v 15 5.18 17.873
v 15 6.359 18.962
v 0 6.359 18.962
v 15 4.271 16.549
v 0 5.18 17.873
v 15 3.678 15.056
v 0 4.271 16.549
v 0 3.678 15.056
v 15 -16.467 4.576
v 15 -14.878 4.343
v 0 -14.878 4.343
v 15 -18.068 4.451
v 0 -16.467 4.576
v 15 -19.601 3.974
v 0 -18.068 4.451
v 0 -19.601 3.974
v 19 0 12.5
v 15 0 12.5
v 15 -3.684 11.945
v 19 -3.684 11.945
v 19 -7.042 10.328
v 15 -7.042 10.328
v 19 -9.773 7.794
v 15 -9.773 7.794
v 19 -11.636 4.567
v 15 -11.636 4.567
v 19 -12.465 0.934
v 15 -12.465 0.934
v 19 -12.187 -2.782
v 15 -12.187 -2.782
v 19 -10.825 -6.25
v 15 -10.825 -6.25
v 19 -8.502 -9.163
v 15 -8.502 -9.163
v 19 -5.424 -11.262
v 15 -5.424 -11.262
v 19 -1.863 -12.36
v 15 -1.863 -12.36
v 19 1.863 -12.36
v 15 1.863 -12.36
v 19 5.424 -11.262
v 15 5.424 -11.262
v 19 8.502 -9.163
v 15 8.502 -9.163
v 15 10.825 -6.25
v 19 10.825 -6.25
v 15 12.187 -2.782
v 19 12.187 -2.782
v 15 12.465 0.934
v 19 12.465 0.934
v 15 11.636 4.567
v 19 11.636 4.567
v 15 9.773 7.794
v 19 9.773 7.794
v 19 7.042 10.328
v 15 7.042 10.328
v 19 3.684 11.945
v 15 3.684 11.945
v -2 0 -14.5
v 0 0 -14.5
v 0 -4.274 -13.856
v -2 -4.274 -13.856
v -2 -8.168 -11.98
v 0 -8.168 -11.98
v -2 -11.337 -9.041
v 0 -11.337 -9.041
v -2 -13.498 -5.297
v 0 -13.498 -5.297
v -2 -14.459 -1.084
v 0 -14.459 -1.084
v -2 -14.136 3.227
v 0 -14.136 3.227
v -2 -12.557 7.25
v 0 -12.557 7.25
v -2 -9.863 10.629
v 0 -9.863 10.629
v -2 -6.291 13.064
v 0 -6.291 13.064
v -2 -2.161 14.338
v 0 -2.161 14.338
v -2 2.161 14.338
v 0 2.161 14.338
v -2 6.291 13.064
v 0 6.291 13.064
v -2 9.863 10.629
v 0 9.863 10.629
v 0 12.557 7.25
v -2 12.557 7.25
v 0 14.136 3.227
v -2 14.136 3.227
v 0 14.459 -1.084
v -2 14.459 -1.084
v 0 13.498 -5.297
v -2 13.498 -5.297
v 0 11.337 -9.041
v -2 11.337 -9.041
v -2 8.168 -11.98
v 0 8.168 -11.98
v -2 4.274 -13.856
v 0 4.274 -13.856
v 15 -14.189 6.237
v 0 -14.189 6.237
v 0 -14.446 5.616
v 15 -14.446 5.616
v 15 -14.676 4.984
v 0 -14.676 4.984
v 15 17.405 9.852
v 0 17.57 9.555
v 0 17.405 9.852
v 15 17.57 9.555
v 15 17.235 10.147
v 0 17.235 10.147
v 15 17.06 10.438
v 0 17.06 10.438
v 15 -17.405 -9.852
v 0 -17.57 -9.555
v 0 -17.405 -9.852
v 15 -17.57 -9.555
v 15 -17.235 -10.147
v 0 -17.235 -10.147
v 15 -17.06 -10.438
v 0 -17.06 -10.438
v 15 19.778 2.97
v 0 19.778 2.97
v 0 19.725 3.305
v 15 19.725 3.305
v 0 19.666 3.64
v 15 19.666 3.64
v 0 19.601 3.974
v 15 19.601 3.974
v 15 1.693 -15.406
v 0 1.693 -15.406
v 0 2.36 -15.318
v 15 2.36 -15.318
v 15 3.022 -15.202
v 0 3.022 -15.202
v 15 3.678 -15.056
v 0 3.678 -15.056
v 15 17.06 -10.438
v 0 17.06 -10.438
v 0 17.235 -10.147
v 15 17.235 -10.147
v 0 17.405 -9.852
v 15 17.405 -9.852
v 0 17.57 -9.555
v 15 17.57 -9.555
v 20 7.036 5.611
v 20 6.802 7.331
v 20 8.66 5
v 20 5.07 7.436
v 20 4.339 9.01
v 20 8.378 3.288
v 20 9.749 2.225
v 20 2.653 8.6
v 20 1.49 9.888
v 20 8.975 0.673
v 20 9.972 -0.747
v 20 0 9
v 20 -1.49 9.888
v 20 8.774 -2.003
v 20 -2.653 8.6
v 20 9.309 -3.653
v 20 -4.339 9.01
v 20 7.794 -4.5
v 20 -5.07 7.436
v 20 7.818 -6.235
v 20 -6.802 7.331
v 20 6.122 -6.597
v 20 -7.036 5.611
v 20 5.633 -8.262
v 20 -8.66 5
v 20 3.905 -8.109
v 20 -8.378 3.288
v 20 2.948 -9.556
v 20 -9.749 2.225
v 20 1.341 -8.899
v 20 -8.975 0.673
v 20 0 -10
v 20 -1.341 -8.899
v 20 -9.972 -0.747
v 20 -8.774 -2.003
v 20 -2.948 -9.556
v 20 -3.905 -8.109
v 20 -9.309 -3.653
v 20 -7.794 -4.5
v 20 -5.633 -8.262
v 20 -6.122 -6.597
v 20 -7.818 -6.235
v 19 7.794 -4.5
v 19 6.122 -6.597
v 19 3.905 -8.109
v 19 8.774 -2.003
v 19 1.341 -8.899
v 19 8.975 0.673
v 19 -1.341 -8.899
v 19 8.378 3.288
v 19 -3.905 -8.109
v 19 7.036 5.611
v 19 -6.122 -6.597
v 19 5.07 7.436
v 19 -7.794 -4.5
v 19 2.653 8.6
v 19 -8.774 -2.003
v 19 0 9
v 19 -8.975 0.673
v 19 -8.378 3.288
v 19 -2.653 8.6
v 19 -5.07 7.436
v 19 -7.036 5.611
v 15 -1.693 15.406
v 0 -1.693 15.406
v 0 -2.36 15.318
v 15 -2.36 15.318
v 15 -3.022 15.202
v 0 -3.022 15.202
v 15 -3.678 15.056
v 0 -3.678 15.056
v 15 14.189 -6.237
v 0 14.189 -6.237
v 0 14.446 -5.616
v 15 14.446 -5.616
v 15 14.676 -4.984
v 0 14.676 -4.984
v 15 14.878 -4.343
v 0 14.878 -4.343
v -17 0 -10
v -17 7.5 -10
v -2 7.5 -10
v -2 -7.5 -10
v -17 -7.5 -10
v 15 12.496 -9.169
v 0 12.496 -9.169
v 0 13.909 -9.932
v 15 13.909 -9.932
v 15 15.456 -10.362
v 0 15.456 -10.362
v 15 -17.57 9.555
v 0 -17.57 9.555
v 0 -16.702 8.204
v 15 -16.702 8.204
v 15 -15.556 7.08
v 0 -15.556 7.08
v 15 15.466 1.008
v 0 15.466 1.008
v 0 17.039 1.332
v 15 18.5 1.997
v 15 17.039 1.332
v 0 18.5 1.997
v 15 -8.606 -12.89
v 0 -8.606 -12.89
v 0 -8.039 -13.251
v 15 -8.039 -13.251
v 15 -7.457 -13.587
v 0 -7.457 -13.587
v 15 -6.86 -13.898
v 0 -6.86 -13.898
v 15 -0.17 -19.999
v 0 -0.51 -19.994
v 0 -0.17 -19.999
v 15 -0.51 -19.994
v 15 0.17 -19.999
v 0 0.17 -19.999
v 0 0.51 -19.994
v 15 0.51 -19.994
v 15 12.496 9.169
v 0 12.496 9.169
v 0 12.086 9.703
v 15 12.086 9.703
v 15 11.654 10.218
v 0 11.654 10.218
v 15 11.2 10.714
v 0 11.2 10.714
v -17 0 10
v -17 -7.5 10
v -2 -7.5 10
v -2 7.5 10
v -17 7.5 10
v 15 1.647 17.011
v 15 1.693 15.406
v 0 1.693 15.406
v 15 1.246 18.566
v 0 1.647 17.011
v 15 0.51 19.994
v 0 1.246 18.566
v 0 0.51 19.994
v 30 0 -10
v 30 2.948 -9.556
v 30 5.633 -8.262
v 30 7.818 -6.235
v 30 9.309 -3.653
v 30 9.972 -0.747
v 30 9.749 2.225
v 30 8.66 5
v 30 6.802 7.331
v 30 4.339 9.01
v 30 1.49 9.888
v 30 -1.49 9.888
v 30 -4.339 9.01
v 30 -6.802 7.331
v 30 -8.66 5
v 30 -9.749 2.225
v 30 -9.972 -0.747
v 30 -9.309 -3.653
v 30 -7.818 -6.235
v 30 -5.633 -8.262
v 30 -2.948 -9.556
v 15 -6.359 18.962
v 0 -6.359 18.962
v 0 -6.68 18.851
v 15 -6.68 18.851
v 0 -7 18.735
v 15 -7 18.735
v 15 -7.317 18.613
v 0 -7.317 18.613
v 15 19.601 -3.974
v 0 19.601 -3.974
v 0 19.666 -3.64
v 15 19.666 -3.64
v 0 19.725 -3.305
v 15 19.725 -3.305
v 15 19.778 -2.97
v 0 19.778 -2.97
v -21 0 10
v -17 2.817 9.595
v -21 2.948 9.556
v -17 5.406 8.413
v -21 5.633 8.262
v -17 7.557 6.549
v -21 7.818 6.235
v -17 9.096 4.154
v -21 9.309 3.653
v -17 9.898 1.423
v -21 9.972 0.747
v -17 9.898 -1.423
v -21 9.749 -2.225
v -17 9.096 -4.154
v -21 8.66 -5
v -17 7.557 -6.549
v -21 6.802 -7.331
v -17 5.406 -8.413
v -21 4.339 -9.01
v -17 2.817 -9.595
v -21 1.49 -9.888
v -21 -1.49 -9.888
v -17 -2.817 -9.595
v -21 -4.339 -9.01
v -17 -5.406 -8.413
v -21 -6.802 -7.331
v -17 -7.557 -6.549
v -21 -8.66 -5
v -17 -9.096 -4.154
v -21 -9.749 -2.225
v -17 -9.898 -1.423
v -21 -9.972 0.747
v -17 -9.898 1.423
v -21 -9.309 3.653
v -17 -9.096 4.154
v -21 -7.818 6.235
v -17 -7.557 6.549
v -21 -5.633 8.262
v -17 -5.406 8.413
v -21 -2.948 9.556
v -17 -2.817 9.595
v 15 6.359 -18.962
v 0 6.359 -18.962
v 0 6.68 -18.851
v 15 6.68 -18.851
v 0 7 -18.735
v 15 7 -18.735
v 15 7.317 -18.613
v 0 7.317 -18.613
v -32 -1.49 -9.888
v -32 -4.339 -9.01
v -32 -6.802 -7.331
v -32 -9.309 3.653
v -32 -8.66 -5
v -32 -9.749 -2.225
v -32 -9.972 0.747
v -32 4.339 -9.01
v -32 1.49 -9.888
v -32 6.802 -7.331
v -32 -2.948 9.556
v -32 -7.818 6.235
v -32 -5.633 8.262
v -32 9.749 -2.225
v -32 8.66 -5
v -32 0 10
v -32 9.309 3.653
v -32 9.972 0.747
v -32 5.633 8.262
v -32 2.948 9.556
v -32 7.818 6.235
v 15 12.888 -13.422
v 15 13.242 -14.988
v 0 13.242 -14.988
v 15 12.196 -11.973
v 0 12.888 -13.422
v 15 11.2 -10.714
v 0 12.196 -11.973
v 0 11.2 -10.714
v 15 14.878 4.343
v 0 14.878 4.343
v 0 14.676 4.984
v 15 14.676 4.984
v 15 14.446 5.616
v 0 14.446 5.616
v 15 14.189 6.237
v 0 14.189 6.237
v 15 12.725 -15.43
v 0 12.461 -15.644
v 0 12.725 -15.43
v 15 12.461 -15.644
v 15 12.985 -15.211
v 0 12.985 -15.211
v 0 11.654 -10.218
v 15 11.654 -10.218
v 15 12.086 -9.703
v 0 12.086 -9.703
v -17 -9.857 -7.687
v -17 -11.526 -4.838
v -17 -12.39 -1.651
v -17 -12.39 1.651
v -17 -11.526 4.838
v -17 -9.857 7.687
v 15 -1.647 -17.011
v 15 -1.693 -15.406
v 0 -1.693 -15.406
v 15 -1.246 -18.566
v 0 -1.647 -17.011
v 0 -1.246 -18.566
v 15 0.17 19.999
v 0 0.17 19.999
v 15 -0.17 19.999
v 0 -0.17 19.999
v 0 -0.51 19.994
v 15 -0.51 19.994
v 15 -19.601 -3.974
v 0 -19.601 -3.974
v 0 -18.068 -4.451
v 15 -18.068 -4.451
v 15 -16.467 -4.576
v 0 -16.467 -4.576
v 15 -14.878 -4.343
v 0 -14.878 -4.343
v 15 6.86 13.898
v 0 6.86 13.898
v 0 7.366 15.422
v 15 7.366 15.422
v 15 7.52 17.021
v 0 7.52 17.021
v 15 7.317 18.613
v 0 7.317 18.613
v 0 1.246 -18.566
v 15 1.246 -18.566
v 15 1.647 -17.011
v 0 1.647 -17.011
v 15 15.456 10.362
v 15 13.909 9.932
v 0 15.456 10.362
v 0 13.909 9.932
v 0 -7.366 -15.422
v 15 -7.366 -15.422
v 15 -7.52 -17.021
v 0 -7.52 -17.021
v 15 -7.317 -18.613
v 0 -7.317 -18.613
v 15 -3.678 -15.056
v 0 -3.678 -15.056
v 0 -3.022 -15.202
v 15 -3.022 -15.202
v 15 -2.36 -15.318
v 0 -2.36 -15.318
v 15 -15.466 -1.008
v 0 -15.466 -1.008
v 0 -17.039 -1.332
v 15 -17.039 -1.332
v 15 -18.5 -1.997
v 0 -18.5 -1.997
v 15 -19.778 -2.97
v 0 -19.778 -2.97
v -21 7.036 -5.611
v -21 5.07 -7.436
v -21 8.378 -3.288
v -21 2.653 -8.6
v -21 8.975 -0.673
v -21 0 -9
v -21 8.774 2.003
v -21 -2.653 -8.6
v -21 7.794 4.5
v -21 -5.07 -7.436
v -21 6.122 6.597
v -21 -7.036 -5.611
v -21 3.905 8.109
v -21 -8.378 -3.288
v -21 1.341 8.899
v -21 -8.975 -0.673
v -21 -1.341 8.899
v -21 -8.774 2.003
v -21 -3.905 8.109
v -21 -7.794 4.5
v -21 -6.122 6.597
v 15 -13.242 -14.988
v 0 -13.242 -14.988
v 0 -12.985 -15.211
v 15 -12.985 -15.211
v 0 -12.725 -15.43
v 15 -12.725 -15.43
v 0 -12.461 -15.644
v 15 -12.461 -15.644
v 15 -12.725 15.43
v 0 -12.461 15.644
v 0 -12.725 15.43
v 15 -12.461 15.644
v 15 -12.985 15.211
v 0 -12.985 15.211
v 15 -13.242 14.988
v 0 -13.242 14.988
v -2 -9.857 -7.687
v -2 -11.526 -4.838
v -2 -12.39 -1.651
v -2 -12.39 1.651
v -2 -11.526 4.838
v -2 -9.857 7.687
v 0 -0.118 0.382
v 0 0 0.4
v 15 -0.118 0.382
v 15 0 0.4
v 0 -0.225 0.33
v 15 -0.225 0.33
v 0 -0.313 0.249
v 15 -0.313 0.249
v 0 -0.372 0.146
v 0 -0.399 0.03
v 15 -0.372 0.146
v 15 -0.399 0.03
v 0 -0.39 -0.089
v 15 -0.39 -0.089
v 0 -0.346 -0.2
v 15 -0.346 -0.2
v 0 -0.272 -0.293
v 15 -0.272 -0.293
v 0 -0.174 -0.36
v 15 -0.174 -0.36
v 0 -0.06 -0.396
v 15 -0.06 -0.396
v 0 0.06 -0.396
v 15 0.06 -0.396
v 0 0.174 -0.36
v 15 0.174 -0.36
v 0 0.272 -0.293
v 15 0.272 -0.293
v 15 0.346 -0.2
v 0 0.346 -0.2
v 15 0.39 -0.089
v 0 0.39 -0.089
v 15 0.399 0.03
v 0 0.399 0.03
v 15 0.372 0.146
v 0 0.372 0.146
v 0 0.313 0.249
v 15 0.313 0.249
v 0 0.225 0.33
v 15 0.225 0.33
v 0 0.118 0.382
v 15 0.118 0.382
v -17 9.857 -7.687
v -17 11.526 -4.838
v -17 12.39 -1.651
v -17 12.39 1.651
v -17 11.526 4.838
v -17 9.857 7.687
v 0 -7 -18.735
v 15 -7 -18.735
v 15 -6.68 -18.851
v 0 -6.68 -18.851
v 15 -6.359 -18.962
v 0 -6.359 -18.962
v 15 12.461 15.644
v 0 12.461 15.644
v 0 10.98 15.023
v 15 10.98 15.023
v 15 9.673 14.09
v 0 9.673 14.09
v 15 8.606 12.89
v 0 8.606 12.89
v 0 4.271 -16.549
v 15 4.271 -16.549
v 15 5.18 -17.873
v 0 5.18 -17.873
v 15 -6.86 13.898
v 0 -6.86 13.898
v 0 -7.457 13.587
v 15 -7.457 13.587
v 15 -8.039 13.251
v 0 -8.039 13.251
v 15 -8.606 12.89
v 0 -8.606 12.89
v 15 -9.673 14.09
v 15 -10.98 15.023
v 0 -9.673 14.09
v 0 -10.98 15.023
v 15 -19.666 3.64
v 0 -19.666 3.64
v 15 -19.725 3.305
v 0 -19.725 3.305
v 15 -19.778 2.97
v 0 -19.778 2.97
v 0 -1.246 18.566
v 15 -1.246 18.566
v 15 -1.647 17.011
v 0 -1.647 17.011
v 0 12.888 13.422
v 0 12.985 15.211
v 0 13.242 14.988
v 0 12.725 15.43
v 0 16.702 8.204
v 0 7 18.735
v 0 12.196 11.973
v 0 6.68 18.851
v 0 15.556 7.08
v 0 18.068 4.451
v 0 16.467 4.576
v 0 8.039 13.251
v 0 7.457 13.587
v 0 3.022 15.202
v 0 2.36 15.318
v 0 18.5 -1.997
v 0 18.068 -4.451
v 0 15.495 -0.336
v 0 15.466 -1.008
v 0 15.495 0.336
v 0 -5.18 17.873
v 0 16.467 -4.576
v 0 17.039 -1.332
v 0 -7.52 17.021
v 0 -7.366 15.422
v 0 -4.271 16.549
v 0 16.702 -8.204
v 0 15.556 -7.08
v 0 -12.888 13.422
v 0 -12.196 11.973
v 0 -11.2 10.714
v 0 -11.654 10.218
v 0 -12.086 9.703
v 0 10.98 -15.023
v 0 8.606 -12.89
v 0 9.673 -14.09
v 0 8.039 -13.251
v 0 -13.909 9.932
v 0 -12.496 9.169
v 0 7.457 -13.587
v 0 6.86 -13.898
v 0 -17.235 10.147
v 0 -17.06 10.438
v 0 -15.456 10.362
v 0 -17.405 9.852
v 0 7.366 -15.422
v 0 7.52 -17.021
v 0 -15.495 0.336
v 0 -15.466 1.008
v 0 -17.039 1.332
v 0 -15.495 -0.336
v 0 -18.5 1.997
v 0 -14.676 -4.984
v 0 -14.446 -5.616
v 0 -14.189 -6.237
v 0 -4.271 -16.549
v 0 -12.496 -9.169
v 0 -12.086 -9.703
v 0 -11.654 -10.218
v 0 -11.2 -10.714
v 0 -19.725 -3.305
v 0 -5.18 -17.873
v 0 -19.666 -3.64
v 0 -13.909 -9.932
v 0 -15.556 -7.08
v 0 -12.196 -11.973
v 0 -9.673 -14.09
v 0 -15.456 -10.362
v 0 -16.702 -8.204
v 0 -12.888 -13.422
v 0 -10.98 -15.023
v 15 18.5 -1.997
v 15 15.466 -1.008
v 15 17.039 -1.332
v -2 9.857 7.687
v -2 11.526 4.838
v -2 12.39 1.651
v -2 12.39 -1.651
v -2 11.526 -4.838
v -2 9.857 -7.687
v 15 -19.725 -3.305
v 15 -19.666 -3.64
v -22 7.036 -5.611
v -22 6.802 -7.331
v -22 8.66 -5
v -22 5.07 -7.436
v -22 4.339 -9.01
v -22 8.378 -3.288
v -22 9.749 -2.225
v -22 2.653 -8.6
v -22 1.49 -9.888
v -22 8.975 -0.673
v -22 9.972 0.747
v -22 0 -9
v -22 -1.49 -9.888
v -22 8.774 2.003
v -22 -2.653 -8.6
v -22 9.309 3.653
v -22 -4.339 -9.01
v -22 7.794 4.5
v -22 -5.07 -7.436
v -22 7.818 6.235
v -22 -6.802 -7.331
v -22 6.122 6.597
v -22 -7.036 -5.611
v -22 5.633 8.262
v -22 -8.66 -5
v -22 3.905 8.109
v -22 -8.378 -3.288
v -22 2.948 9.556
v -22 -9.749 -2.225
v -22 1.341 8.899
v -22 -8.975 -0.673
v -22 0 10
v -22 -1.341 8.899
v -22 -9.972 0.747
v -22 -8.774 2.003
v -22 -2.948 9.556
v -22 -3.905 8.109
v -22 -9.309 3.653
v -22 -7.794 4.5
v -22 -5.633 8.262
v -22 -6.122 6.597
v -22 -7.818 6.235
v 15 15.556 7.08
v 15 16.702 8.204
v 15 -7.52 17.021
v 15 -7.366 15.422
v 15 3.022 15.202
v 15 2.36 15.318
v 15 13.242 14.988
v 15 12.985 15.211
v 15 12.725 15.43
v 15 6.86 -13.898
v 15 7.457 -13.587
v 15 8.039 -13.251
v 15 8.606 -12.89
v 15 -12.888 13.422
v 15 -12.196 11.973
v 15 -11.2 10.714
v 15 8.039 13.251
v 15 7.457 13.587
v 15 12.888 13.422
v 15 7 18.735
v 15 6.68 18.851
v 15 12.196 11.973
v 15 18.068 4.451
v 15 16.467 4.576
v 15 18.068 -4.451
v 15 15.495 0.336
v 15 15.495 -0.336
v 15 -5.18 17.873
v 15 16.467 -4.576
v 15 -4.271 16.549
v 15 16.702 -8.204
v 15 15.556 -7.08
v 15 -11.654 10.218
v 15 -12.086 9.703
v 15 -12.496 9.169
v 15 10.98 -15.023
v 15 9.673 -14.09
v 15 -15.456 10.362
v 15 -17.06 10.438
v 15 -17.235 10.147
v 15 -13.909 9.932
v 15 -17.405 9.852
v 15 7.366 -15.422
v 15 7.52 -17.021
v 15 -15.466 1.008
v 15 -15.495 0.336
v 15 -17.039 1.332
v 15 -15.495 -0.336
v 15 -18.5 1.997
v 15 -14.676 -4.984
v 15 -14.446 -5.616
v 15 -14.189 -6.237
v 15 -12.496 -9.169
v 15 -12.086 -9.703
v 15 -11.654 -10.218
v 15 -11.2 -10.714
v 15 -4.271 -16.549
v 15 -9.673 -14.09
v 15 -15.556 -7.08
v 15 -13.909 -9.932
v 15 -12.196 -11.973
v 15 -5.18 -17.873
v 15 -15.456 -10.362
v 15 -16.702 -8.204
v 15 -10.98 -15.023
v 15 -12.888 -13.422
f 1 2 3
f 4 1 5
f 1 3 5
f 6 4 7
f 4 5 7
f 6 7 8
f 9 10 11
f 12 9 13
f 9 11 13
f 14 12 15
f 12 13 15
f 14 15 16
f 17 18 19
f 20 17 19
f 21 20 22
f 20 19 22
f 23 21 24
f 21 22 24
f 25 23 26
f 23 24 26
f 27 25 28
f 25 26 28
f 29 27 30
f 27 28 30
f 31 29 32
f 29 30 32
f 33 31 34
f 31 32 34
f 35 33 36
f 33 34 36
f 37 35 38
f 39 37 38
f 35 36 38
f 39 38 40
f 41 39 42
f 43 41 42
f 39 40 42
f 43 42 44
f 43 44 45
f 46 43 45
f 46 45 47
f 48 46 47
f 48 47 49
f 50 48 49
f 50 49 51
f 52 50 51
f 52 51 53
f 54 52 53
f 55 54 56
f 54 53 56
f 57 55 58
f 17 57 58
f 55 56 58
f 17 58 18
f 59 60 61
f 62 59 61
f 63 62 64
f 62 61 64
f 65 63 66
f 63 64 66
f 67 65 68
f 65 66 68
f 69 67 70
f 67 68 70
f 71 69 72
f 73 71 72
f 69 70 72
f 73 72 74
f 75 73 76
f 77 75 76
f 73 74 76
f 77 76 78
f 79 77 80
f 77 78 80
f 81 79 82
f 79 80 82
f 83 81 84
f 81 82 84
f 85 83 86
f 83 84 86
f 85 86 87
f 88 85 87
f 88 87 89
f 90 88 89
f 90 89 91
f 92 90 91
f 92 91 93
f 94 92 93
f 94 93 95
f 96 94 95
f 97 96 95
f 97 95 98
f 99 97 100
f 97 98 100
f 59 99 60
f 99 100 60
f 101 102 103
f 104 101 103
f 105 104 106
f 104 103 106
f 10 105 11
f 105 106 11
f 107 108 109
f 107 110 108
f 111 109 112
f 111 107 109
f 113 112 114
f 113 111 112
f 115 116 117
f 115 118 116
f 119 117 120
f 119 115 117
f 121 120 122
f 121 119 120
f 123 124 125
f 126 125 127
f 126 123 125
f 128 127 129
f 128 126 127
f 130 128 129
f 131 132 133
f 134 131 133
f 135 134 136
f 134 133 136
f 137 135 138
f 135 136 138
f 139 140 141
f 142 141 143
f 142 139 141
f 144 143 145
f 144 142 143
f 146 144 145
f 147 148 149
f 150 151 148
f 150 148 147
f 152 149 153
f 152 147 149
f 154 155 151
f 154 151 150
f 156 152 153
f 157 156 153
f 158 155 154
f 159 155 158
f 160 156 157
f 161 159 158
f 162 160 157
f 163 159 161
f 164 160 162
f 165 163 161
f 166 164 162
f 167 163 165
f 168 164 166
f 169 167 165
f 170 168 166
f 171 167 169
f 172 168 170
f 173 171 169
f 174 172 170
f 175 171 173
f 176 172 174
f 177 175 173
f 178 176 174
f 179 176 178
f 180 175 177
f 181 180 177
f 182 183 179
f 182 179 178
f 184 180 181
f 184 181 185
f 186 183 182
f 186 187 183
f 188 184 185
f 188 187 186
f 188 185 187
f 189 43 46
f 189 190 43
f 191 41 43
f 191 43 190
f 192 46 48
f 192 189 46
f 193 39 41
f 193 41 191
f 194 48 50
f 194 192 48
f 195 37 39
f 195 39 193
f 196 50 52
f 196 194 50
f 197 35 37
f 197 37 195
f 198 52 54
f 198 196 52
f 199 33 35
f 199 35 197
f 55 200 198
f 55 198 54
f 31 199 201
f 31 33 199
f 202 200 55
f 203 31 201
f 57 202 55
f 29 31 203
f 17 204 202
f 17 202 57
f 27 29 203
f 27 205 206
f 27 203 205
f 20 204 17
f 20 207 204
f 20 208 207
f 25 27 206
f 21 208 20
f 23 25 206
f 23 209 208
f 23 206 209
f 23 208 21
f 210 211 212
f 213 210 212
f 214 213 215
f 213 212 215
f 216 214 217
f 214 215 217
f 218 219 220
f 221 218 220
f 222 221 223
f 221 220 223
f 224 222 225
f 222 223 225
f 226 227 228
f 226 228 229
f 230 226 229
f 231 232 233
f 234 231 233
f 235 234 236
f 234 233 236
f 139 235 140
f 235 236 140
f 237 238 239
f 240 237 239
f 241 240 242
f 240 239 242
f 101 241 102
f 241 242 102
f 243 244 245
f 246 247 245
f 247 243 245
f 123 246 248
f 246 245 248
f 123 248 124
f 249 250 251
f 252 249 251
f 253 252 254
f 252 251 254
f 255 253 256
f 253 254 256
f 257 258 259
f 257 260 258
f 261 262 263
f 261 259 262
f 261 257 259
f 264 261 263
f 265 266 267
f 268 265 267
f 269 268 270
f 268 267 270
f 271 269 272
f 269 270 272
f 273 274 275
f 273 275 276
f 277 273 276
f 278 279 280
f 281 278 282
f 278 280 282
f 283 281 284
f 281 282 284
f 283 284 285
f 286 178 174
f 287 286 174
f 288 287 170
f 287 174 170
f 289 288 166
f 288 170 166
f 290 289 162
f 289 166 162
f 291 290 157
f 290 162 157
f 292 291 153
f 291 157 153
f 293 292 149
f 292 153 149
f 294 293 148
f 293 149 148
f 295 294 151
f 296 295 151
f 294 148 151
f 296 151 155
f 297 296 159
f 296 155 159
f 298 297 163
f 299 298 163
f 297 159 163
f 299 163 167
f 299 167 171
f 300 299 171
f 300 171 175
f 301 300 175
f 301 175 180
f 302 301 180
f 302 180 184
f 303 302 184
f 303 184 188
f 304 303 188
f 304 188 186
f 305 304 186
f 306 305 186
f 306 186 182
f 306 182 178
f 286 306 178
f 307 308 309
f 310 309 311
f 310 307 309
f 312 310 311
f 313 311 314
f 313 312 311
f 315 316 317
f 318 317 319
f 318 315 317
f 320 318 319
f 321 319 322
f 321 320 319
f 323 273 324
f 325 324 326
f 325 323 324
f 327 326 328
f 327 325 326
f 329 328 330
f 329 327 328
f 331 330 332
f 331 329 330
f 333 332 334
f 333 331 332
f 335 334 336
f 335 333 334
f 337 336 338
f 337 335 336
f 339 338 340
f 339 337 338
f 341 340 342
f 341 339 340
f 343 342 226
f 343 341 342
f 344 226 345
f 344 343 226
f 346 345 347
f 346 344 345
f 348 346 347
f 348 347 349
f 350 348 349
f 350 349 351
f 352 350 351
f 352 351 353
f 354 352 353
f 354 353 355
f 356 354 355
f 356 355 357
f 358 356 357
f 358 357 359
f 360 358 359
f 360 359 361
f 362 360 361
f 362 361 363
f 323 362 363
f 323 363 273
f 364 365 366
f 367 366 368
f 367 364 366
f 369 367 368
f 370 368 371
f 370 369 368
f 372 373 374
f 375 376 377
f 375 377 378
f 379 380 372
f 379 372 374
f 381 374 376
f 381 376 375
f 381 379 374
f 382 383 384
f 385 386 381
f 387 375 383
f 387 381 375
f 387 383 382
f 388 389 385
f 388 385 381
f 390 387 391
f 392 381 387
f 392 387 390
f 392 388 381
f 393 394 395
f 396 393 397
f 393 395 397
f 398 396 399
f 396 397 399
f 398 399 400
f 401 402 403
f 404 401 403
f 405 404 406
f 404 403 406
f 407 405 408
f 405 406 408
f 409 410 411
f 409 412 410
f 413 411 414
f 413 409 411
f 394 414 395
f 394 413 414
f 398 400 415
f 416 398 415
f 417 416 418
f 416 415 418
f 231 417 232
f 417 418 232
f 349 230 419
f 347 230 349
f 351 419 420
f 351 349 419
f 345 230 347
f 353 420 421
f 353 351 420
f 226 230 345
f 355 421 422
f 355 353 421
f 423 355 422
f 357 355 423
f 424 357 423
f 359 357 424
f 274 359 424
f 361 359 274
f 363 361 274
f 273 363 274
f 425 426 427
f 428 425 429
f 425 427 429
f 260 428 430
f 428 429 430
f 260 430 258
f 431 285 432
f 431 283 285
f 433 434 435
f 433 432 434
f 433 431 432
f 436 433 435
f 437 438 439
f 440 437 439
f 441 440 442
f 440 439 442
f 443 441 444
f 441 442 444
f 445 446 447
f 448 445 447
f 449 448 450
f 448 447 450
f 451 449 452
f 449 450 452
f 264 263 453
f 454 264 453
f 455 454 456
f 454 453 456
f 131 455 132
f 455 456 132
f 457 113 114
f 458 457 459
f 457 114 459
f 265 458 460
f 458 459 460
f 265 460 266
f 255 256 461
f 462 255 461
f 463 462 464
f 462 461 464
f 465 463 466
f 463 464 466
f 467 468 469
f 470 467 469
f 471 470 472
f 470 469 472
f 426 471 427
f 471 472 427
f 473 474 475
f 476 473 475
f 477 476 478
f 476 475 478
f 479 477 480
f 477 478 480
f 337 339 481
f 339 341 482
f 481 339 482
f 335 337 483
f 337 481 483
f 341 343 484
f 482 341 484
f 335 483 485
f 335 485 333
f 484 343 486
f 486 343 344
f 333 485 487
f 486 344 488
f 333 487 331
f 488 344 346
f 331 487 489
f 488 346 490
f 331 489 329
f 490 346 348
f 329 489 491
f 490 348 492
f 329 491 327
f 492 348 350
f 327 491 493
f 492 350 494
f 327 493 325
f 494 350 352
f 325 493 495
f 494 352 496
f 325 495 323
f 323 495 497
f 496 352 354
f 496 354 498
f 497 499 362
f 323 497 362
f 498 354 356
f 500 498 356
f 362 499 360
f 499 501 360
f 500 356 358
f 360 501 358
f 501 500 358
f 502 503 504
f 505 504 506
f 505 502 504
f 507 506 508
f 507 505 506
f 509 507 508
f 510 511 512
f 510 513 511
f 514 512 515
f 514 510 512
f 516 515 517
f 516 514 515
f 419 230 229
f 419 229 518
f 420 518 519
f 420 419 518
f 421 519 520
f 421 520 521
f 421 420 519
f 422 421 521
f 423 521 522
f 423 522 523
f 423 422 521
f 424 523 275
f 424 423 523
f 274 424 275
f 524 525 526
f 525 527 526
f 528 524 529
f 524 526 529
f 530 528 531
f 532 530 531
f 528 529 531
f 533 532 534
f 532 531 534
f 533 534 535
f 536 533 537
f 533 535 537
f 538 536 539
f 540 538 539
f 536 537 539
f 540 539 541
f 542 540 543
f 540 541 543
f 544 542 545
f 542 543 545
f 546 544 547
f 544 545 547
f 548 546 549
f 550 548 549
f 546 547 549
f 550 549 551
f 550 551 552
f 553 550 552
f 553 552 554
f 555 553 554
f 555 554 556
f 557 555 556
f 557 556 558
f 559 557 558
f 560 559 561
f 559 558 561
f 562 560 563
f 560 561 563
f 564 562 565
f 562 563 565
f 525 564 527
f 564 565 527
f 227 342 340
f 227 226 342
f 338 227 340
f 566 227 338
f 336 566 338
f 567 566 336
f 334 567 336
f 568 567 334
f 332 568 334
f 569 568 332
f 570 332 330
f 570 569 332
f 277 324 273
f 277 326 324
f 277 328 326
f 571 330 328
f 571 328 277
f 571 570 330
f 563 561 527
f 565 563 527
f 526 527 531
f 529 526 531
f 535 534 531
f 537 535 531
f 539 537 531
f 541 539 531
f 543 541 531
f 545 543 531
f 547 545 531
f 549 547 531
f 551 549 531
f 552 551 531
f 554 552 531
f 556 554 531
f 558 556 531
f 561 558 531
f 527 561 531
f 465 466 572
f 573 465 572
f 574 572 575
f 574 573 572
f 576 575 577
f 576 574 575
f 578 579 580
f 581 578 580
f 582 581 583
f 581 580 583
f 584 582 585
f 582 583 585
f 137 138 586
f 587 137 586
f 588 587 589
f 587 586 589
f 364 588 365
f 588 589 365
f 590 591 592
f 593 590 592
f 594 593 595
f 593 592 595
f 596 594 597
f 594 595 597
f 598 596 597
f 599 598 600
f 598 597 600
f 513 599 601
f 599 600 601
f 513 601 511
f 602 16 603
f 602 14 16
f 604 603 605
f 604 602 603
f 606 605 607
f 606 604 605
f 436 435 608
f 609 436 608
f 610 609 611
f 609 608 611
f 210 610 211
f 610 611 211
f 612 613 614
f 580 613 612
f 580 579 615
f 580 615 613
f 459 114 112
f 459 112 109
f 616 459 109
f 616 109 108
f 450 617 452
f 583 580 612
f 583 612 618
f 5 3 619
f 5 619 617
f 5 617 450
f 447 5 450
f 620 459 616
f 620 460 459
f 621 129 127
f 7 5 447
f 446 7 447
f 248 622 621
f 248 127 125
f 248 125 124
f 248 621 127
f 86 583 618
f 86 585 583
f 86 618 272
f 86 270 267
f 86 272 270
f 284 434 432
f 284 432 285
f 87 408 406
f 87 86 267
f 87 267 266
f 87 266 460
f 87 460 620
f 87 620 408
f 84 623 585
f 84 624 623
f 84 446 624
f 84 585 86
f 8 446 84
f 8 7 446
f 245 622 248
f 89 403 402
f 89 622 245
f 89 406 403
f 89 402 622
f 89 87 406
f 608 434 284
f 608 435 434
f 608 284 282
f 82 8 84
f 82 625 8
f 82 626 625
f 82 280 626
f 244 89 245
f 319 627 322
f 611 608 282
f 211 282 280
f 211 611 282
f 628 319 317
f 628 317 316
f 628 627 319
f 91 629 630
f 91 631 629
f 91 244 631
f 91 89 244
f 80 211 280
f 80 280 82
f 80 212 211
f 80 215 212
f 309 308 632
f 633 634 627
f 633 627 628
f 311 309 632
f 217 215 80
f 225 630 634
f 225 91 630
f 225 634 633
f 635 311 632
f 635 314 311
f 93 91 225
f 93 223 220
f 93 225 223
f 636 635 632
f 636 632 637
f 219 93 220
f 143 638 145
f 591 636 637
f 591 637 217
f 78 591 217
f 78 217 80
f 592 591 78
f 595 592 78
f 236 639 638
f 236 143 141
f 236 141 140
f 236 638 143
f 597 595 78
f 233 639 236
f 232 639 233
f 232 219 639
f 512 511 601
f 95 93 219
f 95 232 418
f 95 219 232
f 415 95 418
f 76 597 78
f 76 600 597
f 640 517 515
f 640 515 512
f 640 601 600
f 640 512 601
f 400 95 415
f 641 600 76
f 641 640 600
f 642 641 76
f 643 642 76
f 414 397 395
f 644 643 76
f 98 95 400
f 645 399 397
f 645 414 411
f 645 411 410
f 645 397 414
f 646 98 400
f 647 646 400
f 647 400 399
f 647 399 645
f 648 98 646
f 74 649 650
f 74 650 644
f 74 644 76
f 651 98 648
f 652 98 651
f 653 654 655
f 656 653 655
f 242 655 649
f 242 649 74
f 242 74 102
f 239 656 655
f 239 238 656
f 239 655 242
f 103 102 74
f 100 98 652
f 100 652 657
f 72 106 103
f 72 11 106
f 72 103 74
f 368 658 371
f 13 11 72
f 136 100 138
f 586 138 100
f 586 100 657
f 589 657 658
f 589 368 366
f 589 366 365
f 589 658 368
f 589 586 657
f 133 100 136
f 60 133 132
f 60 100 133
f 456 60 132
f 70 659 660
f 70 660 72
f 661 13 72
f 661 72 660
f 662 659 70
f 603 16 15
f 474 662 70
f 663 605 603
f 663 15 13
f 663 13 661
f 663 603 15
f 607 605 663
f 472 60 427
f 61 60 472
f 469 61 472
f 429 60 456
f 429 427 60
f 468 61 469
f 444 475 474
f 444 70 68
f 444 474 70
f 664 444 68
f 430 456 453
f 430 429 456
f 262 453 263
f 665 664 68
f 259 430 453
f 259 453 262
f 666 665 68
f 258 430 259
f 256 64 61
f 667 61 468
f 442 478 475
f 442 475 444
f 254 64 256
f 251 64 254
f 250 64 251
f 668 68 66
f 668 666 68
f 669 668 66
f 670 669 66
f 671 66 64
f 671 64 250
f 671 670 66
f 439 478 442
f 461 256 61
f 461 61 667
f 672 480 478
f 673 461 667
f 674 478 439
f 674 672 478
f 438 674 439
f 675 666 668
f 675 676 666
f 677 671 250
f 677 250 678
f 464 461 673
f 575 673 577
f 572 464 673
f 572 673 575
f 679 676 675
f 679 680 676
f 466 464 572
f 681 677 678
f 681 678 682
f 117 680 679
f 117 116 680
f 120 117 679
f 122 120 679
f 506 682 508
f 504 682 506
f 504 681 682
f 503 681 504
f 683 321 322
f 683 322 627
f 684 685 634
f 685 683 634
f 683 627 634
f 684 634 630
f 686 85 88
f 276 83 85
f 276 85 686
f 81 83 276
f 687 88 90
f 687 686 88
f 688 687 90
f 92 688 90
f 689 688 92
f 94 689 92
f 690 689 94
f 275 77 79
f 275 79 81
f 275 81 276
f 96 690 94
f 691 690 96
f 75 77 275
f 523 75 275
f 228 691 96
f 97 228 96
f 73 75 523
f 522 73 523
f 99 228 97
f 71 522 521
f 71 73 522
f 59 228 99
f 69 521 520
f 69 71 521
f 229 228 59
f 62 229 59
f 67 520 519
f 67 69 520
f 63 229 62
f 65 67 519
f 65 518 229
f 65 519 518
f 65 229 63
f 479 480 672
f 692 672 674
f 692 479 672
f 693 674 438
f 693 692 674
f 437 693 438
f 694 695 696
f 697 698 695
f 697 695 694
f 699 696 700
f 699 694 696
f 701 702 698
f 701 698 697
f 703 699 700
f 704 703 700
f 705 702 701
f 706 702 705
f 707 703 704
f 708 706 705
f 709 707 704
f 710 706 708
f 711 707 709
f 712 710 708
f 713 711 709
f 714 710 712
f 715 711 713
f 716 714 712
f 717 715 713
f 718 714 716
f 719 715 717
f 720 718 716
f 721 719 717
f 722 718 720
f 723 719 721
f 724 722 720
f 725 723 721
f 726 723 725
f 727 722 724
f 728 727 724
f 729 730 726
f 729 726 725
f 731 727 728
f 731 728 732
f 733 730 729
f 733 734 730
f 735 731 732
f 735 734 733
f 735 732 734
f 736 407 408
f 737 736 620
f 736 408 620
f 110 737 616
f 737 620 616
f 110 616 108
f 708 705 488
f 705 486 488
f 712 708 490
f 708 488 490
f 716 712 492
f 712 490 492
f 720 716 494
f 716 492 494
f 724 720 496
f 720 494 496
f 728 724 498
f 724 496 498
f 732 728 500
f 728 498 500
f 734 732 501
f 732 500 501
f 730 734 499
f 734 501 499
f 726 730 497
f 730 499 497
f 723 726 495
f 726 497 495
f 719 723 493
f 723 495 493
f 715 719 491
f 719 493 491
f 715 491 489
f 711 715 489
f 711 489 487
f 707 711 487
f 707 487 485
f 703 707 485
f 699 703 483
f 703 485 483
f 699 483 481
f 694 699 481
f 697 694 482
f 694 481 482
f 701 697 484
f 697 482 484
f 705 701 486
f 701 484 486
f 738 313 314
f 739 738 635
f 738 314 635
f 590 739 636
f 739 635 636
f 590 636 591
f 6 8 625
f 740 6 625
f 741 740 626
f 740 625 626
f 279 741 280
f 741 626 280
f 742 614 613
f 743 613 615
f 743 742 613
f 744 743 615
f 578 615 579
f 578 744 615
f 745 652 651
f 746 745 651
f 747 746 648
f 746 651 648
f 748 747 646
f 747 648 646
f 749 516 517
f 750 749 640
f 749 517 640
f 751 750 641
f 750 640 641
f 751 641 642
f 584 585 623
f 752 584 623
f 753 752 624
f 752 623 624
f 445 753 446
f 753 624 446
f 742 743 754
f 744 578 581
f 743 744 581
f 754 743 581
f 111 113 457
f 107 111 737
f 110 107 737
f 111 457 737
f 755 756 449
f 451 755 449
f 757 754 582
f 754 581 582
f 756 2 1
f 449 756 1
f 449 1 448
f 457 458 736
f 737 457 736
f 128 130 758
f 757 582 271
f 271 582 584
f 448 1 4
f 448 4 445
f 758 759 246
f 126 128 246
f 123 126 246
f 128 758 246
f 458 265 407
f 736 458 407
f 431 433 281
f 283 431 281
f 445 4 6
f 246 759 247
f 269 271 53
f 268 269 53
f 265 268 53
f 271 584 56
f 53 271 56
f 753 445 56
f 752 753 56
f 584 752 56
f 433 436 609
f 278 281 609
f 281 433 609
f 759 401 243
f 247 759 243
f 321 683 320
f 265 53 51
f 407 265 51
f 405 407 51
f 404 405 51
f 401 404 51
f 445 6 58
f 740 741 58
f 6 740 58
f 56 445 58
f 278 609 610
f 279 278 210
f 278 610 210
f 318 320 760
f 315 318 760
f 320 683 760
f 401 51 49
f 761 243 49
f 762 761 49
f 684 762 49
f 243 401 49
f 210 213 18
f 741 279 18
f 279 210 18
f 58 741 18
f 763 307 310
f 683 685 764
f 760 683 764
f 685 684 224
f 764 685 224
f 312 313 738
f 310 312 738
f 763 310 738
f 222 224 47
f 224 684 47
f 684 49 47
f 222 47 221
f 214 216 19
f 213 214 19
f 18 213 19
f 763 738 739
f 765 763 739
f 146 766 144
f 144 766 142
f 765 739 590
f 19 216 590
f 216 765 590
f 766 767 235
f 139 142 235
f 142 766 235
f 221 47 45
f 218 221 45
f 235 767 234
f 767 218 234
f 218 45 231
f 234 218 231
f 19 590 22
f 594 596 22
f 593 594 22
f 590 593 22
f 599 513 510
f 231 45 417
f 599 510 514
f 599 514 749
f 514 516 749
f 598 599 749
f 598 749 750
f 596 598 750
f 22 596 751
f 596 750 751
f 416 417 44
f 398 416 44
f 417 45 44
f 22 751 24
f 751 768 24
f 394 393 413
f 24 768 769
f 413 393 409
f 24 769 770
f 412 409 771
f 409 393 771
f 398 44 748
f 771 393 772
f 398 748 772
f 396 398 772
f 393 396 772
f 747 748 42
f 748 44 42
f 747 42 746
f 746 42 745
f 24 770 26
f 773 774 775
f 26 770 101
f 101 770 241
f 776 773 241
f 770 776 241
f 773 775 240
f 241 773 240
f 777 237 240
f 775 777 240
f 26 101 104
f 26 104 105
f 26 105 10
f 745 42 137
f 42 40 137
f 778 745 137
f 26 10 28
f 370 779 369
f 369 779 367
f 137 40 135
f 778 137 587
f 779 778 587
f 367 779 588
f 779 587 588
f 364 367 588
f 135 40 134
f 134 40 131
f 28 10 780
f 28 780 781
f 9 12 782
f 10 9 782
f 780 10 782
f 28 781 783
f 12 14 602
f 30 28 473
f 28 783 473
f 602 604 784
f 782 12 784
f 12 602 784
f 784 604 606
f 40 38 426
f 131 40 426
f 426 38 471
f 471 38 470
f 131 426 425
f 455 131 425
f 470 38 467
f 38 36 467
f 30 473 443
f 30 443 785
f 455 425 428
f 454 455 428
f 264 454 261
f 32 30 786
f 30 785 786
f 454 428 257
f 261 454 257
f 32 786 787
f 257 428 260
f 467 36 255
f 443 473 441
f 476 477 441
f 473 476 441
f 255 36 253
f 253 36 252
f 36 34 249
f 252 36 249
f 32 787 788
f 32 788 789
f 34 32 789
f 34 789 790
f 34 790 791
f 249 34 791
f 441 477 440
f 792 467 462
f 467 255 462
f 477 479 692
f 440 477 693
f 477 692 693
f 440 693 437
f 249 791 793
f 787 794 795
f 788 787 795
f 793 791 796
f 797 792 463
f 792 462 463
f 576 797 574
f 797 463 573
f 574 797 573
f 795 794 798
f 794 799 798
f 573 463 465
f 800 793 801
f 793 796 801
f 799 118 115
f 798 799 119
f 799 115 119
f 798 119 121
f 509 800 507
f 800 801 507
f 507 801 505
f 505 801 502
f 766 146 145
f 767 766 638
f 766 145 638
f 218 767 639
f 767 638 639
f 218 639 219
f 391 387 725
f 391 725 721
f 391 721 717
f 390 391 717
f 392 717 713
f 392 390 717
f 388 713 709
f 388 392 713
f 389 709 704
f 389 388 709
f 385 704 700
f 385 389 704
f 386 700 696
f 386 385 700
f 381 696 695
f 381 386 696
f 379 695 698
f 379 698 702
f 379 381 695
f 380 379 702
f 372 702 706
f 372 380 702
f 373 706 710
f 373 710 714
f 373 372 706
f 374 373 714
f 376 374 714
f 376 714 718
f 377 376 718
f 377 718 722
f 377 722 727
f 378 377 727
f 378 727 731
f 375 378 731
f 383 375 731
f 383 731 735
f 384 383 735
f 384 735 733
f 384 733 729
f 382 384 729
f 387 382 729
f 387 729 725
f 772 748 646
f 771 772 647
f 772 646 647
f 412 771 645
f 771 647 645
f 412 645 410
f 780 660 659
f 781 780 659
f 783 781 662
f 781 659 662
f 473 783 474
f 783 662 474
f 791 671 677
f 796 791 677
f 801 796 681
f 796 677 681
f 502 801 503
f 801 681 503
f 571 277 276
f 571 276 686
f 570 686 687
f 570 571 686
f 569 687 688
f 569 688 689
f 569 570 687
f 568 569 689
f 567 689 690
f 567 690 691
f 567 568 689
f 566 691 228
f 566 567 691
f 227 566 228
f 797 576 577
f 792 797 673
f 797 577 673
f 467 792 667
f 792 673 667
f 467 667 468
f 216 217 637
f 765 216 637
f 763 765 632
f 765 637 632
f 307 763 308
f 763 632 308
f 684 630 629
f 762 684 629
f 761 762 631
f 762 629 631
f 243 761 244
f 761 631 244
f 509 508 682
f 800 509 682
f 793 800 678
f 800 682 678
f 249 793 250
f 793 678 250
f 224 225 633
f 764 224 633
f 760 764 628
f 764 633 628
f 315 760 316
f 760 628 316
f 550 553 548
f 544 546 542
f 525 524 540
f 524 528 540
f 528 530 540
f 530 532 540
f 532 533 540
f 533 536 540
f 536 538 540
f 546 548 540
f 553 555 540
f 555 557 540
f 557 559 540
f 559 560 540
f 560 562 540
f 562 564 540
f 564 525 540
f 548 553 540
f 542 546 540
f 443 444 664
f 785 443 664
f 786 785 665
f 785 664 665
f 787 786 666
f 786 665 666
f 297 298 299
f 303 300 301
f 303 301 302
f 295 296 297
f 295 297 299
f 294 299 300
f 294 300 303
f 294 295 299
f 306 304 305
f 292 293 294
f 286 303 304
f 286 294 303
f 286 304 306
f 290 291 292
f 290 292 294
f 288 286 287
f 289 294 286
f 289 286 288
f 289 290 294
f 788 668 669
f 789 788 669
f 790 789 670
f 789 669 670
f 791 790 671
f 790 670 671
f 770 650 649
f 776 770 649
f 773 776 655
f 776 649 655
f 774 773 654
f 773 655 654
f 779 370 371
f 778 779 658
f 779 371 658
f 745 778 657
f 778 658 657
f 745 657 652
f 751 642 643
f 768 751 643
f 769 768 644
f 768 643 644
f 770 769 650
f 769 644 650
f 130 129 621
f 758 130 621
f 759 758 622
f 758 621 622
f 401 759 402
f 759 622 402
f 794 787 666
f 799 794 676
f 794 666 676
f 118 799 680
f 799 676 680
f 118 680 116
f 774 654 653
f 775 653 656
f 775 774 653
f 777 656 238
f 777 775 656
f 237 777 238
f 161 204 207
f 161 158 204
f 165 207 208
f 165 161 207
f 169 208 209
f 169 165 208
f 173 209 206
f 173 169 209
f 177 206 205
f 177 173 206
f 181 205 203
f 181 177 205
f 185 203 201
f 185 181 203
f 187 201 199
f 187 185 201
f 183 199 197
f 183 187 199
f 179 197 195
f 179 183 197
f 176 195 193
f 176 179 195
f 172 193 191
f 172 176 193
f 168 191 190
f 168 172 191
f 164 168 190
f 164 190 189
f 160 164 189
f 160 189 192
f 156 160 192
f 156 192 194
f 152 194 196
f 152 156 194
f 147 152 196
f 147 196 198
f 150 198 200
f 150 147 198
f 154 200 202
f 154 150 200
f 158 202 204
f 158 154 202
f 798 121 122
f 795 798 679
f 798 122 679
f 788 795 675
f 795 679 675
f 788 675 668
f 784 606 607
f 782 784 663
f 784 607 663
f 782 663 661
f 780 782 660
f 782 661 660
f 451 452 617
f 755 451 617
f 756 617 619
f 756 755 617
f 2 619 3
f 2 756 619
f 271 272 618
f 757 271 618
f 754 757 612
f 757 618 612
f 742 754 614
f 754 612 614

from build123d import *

# Parameters (mm, degrees)
BASPROSKE_W         = 15
BASPROSKE_H         = 20
TOOTHCUT_DEPTH      = 33.015621187
TEETHCUTS_COUNT     = 18
TEETHCUTS_ANGLE     = 340
BORSKE_R            = 0.4
BORE_DEPTH          = 50.0000508
SKETCH1_R           = 12.5
BOSS_EXTRUDE1_DEPTH = 4
SKETCH1_3_R         = 10
BOSS_EXTRUDE2_DEPTH = 15
SKETCH2_W           = 1
SKETCH2_H           = 1
SKETCH3_R           = 14.5
BOSS_EXTRUDE3_DEPTH = 2
BOSS_EXTRUDE4_START = 17
SKETCH3_3_R         = 12.5
BOSS_EXTRUDE4_DEPTH = 17
BOSS_EXTRUDE5_START = 32
SKETCH3_4_R         = 10
BOSS_EXTRUDE5_DEPTH = 32
SKETCH4_W           = 1
SKETCH4_H           = 1
SKETCH5_OUTSIDE_W   = 58.744
SKETCH5_OUTSIDE_H   = 58.3
CUT_EXTRUDE1_DEPTH  = 15


with BuildPart() as part:
    # BasProSke → Base-Revolve (revolve)
    with BuildSketch(Plane(origin=(0, 0, 0), x_dir=(1, 0, 0), z_dir=(0, 1, 0)), mode=Mode.PRIVATE) as base_revolve_sk:
        with Locations((7.5, 10)):
            Rectangle(BASPROSKE_W, BASPROSKE_H)
    revolve(base_revolve_sk.sketch.rotate(Axis((-10, 0, 0), (1, 0, 0)), 180), axis=Axis((-10, 0, 0), (1, 0, 0)))

    # TooCutSke → ToothCut (cut, through all)
    with BuildSketch(Plane(origin=(0, 0, 0), x_dir=(0, 0, -1), z_dir=(1, 0, 0))):
        with BuildLine():
            ThreePointArc((1.007799284, 15.466199973), (0, 15.499), (-1.007799284, 15.466199973))
            ThreePointArc((-1.007799284, 15.466199973), (-1.630454606, 17.802374148), (-2.991345877, 19.800719558))
            ThreePointArc((-2.991345877, 19.800719558), (0, 20.0254), (2.991345877, 19.800719558))
            ThreePointArc((2.991345877, 19.800719558), (1.630454606, 17.802374148), (1.007799284, 15.466199973))
        make_face()
    toothcut = extrude(amount=TOOTHCUT_DEPTH, mode=Mode.SUBTRACT)

    # TeethCuts: ToothCut ×18 about axis
    teethcuts_axis = Axis((-10, 0, 0), (1, 0, 0))
    for i in range(1, TEETHCUTS_COUNT):
        add(toothcut.rotate(teethcuts_axis, i * TEETHCUTS_ANGLE / (TEETHCUTS_COUNT - 1)), mode=Mode.SUBTRACT)

    # BorSke → Bore (cut, symmetric)
    with BuildSketch(Plane(origin=(0, 0, 0), x_dir=(0, 0, -1), z_dir=(1, 0, 0))):
        with Locations(Location((0, 0, 0), (0, 0, 180))):
            Circle(BORSKE_R)
    extrude(amount=BORE_DEPTH, both=True, mode=Mode.SUBTRACT)

    # Sketch1 → Boss-Extrude1 (add)
    with BuildSketch(Plane(origin=(15, 0, 0), x_dir=(0, 0, -1), z_dir=(1, 0, 0))):
        with Locations(Location((0, 0, 0), (0, 0, 180))):
            Circle(SKETCH1_R)
    extrude(amount=BOSS_EXTRUDE1_DEPTH)

    # Sketch1<3> → Boss-Extrude2 (add)
    with BuildSketch(Plane(origin=(15, 0, 0), x_dir=(0, 0, -1), z_dir=(1, 0, 0))):
        Circle(SKETCH1_3_R)
    extrude(amount=BOSS_EXTRUDE2_DEPTH)

    # Sketch2 → Cut-Revolve1 (revolve, cut)
    with BuildSketch(Plane.XY, mode=Mode.PRIVATE) as cut_revolve1_sk:
        with Locations((19.5, 9.5)):
            Rectangle(SKETCH2_W, SKETCH2_H)
    revolve(cut_revolve1_sk.sketch.rotate(Axis((0, 0, 0), (1, 0, 0)), 90), axis=Axis((0, 0, 0), (1, 0, 0)), mode=Mode.SUBTRACT)

    # Sketch3 → Boss-Extrude3 (add)
    with BuildSketch(Plane.ZY):
        with Locations(Location((0, 0, 0), (0, 0, 180))):
            Circle(SKETCH3_R)
    extrude(amount=BOSS_EXTRUDE3_DEPTH)

    # Sketch3<3> → Boss-Extrude4 (add)
    with BuildSketch(Plane.ZY.offset(BOSS_EXTRUDE4_START)):
        Circle(SKETCH3_3_R)
    extrude(amount=-BOSS_EXTRUDE4_DEPTH)

    # Sketch3<4> → Boss-Extrude5 (add)
    with BuildSketch(Plane.ZY.offset(BOSS_EXTRUDE5_START)):
        Circle(SKETCH3_4_R)
    extrude(amount=-BOSS_EXTRUDE5_DEPTH)

    # Sketch4 → Cut-Revolve2 (revolve, cut)
    with BuildSketch(Plane.XY, mode=Mode.PRIVATE) as cut_revolve2_sk:
        with Locations((-21.5, 9.5)):
            Rectangle(SKETCH4_W, SKETCH4_H)
    revolve(cut_revolve2_sk.sketch.rotate(Axis((0, 0, 0), (-1, 0, 0)), 90), axis=Axis((0, 0, 0), (-1, 0, 0)), mode=Mode.SUBTRACT)

    # Sketch5 outside → Cut-Extrude1 (cut)
    with BuildSketch(Plane.ZY.offset(17)):
        Rectangle(SKETCH5_OUTSIDE_W, SKETCH5_OUTSIDE_H)
        with BuildLine():
            Line((-10, 7.5), (-10, -7.5))
            ThreePointArc((-10, -7.5), (0, -12.5), (10, -7.5))
            Line((10, -7.5), (10, 7.5))
            ThreePointArc((10, 7.5), (0, 12.5), (-10, 7.5))
        make_face(mode=Mode.SUBTRACT)
    extrude(amount=-CUT_EXTRUDE1_DEPTH, mode=Mode.SUBTRACT)


solid = part.part
